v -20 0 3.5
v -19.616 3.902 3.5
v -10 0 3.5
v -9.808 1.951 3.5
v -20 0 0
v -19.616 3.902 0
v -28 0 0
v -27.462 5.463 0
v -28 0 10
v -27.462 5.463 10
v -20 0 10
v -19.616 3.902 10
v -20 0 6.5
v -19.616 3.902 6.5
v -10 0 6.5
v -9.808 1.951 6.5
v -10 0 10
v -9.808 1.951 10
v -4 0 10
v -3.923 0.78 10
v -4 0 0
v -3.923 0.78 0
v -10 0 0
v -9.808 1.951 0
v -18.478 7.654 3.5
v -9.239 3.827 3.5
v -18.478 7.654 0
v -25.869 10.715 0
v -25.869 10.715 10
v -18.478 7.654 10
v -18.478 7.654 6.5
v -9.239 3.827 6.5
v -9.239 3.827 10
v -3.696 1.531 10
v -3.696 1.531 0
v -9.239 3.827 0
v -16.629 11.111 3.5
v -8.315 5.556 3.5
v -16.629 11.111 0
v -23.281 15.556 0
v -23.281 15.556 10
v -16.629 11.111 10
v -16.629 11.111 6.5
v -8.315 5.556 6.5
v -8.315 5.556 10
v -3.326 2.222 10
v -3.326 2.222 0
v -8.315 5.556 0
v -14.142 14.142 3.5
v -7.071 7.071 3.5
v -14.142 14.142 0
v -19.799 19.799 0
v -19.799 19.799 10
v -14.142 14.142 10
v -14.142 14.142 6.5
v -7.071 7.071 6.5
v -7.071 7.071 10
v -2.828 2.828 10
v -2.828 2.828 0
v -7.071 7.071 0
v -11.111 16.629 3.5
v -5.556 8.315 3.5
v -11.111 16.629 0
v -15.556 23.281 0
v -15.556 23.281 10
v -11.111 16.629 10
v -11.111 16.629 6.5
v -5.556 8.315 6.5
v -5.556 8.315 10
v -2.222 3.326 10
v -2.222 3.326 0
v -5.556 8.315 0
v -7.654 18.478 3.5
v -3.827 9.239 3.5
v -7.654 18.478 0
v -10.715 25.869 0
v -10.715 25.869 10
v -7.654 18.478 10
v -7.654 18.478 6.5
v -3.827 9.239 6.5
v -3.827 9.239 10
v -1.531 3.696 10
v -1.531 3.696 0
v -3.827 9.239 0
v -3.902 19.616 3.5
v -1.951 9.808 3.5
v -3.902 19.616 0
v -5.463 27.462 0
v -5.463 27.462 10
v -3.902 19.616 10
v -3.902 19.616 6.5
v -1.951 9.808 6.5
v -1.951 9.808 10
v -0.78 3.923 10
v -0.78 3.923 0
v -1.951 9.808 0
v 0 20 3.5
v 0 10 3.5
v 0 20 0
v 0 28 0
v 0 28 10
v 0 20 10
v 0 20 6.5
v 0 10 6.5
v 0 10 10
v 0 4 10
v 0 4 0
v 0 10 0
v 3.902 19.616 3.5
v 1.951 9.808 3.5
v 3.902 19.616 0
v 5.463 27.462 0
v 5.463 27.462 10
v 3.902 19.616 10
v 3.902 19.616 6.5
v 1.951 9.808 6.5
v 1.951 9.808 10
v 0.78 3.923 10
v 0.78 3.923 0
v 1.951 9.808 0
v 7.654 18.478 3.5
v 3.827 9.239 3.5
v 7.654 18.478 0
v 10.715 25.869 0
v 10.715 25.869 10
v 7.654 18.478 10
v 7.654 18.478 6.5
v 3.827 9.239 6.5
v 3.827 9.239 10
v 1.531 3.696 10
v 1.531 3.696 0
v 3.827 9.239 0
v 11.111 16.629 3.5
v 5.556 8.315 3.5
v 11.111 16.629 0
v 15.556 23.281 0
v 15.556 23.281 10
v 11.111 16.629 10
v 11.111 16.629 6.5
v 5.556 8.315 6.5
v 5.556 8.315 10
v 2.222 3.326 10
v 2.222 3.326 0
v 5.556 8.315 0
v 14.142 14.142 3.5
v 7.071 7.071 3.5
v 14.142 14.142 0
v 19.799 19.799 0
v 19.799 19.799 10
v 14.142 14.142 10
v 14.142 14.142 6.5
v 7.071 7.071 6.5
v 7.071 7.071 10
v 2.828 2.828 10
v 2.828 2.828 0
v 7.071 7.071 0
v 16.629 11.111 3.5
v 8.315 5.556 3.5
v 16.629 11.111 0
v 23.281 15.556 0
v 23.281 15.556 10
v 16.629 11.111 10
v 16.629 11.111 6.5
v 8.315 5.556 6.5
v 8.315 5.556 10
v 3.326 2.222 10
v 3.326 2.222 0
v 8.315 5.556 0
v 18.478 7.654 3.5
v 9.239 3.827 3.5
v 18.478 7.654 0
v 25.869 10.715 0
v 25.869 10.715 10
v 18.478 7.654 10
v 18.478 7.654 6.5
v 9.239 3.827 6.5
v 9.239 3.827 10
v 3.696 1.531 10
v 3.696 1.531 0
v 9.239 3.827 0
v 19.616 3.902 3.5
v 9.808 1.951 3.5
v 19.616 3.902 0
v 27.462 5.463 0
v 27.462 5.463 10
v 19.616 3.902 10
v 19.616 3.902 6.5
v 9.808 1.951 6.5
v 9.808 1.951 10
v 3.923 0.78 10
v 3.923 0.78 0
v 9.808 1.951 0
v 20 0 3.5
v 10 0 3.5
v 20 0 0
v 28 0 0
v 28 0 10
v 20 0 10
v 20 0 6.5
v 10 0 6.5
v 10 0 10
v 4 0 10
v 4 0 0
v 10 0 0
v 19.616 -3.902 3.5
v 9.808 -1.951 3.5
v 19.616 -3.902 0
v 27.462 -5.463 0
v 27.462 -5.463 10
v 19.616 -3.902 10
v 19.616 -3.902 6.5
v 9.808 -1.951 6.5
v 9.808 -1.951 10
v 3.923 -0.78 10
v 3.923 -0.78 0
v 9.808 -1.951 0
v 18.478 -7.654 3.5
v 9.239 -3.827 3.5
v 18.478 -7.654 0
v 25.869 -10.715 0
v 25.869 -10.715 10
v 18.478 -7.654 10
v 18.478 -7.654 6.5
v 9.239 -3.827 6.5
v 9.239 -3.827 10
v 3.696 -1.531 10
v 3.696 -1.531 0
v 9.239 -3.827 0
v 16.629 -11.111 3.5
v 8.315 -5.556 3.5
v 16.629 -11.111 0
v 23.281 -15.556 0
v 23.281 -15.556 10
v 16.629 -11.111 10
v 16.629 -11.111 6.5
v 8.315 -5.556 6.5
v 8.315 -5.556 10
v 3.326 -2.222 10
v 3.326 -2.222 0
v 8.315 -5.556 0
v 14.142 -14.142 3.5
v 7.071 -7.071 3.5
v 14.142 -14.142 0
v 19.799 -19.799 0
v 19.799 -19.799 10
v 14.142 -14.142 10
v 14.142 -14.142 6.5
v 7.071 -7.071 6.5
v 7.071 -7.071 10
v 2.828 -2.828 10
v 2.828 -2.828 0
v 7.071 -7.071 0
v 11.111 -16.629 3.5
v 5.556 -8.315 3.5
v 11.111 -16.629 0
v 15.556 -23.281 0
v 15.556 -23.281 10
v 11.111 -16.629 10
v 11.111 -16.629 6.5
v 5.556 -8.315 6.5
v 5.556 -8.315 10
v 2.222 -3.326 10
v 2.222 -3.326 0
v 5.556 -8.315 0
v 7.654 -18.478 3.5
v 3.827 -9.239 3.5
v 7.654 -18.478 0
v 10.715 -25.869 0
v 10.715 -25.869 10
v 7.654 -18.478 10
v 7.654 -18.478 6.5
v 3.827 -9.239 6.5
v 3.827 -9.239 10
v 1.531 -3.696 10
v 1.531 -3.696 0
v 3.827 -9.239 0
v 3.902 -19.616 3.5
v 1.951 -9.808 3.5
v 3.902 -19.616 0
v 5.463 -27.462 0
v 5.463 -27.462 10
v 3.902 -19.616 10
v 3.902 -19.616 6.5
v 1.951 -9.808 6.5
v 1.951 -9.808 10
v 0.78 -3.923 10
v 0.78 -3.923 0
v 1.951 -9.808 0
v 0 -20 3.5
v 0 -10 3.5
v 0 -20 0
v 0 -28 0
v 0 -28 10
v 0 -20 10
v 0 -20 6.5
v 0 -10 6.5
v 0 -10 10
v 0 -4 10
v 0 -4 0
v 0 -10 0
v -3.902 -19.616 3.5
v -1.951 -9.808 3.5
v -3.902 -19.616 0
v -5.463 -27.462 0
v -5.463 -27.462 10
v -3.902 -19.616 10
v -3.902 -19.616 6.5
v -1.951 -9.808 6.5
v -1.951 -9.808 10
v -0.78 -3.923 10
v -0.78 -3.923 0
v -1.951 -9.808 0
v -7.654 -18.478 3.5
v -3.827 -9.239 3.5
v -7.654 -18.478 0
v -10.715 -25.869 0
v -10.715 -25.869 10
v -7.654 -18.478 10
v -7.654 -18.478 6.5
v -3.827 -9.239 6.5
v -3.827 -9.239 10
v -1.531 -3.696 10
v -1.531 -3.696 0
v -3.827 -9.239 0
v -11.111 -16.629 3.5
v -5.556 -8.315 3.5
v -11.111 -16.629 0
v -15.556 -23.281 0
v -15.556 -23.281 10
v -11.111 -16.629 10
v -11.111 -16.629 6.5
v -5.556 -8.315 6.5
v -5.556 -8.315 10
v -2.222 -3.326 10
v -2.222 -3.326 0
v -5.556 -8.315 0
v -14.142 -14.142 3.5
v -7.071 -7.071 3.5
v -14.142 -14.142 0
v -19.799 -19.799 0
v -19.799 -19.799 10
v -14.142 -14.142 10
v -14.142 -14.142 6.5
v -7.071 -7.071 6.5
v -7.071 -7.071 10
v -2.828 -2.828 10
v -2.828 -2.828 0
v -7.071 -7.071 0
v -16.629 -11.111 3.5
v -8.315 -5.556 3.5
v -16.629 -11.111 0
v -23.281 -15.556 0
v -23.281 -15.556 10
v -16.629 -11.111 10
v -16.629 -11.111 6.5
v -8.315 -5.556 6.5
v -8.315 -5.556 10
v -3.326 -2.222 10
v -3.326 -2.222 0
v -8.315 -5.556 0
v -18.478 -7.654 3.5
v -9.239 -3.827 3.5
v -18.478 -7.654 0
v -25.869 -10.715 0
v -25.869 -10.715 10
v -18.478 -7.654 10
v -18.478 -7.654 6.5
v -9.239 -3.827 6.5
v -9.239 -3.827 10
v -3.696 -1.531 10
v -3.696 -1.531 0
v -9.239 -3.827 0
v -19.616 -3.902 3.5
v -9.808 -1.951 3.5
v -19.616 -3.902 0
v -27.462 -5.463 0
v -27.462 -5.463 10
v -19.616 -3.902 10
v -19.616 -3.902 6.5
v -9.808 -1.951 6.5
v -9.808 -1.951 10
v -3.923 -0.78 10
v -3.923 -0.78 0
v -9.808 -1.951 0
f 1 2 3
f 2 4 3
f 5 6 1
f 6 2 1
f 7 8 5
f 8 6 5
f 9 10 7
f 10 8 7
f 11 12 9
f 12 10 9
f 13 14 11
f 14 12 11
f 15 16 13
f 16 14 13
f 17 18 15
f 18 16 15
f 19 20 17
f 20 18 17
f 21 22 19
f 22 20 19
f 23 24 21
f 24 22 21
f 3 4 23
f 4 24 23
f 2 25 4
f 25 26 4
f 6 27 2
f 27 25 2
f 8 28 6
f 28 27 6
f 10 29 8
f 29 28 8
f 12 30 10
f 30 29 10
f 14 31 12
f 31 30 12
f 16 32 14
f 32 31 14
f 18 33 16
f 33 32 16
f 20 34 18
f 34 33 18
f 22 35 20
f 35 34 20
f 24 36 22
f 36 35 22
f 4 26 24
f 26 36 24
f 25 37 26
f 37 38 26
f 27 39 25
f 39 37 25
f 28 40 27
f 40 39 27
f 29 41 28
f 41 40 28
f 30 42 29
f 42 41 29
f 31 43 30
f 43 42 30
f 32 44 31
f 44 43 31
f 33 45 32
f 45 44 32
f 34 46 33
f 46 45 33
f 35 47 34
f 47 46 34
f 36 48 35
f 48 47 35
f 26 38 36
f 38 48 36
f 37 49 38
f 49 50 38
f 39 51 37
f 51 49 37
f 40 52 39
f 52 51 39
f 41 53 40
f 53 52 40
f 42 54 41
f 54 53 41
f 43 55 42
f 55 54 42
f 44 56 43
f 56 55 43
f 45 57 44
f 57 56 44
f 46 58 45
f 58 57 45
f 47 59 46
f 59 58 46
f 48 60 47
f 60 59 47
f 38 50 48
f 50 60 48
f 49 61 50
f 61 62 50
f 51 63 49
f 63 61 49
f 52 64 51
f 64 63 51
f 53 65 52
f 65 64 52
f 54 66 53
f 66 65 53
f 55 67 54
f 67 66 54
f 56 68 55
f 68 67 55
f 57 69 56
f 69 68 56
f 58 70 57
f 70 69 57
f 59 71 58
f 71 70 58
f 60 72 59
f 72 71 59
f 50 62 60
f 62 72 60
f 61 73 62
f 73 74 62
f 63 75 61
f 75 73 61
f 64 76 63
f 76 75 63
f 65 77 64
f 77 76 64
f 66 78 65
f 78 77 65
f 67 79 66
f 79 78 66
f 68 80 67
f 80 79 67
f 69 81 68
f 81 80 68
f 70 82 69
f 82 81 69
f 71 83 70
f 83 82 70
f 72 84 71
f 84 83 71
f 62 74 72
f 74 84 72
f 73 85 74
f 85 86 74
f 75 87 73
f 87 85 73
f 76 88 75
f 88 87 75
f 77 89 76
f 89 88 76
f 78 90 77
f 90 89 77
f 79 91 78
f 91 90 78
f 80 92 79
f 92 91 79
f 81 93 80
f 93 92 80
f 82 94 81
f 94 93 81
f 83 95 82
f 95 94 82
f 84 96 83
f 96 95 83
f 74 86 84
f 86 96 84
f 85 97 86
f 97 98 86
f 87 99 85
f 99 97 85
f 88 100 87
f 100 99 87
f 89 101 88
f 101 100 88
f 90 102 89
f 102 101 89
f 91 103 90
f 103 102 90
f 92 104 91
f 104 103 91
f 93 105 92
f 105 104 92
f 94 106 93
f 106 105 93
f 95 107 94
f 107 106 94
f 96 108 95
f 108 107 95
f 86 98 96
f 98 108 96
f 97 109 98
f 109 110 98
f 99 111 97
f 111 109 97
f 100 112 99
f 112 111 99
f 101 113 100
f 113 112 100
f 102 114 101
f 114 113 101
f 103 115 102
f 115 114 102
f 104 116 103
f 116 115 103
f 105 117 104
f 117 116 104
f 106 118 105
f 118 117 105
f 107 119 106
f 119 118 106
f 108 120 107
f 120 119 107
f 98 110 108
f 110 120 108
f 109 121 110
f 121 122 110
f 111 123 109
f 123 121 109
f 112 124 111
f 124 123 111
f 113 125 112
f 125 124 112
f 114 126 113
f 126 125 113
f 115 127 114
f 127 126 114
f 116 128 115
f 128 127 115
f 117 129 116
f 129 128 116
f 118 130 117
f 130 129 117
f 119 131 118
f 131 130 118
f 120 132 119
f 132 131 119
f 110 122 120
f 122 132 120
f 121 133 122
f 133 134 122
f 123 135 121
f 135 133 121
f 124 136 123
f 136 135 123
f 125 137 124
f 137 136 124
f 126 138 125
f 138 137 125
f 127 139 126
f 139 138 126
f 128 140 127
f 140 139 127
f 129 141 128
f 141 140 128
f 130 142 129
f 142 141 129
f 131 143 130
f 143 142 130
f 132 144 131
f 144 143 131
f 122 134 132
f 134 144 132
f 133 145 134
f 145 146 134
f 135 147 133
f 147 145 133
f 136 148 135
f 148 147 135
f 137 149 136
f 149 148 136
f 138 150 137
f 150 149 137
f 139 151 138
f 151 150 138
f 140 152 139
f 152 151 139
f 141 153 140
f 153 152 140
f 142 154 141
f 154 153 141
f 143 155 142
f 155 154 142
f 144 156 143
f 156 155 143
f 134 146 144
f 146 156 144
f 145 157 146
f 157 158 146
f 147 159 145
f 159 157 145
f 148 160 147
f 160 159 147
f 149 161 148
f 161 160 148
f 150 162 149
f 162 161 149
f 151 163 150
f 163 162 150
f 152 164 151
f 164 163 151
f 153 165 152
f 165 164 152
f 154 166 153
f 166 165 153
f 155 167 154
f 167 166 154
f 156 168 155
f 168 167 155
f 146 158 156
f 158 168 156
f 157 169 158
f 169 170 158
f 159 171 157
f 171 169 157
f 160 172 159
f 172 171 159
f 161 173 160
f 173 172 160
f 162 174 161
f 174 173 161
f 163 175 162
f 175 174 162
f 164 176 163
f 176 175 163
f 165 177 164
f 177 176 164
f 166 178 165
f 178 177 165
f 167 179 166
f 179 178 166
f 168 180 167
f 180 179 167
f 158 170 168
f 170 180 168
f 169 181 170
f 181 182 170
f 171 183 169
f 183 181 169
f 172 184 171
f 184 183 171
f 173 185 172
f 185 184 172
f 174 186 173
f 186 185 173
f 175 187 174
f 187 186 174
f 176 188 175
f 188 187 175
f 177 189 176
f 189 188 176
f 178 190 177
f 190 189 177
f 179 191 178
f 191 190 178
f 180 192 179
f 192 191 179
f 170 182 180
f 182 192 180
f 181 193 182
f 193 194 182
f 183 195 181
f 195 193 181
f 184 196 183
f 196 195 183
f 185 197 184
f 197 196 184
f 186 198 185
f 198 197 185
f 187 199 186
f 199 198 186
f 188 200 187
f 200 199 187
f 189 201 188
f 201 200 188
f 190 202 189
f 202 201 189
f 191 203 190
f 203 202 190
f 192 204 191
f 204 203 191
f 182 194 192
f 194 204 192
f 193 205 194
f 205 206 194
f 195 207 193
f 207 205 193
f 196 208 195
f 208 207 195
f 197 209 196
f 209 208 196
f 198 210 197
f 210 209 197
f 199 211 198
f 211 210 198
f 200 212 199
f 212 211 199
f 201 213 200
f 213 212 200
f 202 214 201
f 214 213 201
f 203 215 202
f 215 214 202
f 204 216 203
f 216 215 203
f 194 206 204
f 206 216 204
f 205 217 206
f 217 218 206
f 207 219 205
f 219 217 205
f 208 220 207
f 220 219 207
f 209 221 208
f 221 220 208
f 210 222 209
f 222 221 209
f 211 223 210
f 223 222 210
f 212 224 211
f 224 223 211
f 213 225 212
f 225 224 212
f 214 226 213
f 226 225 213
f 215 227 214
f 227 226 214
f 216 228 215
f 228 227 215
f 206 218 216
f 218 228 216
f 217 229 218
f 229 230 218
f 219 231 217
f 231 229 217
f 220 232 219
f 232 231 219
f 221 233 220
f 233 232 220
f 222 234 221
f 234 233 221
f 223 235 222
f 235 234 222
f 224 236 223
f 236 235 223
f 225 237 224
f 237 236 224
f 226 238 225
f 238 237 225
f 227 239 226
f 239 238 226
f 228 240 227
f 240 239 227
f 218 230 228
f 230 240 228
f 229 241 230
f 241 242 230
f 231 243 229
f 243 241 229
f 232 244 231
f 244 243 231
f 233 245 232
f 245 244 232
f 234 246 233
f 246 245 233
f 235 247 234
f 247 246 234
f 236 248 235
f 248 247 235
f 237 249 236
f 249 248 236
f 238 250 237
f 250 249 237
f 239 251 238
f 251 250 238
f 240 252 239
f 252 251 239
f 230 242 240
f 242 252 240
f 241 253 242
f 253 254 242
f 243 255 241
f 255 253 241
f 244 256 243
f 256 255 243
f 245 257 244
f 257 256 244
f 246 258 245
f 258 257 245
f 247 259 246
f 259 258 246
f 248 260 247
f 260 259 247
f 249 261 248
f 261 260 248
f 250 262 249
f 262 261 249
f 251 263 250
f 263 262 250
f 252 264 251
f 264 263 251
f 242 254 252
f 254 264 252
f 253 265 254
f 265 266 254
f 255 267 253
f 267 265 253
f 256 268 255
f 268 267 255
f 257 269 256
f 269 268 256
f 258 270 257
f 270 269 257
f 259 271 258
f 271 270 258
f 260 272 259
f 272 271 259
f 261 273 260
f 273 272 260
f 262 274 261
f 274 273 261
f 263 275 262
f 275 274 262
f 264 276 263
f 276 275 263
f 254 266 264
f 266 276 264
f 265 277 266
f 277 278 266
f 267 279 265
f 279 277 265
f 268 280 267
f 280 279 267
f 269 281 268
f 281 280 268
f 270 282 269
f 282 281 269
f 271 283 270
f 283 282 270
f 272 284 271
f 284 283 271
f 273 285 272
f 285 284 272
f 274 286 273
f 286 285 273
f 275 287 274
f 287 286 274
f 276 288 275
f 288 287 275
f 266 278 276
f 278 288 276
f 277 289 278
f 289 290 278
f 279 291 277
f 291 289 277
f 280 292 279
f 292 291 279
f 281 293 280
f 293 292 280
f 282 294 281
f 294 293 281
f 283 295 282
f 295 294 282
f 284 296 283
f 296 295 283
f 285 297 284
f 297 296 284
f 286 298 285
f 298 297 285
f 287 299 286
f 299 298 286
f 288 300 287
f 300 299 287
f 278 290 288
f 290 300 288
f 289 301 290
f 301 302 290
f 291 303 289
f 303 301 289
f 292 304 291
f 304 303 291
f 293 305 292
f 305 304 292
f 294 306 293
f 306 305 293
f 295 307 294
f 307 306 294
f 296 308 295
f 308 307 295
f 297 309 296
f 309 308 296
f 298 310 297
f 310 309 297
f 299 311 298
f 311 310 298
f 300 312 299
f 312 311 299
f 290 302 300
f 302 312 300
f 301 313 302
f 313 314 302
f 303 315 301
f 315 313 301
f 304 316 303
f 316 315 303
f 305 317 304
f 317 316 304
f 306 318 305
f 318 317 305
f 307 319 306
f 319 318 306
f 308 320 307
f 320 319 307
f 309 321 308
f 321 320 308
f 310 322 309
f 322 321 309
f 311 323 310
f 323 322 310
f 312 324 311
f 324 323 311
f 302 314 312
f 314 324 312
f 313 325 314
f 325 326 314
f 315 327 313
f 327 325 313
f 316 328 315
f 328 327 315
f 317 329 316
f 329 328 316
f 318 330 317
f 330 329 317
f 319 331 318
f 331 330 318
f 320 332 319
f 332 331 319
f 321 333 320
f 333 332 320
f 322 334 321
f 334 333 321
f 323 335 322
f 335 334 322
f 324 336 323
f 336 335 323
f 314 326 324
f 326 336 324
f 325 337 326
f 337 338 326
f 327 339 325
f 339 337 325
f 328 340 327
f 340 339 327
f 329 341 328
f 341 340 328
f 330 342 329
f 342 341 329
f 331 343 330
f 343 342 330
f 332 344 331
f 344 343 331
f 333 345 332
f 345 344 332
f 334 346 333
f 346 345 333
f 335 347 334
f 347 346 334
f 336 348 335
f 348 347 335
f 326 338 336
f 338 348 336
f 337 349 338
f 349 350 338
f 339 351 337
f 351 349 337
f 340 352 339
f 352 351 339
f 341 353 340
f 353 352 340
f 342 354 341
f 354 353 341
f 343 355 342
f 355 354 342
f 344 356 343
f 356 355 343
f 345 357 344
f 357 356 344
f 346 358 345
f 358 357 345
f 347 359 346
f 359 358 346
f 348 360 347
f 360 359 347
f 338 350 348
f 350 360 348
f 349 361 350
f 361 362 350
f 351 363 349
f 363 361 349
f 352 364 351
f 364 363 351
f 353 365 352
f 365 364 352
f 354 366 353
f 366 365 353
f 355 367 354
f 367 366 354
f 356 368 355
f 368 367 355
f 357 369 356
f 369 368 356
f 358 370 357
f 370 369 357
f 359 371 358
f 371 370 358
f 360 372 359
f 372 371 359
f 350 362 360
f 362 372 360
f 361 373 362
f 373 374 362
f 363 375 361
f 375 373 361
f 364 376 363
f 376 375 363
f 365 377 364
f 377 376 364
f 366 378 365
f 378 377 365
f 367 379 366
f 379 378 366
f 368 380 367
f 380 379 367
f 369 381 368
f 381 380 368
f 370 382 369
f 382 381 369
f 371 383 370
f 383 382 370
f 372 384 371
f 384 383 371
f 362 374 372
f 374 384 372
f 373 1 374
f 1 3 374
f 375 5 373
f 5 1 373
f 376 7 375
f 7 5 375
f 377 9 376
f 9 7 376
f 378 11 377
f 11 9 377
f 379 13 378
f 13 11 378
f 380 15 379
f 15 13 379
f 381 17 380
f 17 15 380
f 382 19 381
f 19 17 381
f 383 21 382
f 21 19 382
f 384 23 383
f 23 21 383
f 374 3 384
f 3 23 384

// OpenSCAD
$fn = 32;

// ----------------------------------------------------------------------
// Revolved part: handwheel R28
// ----------------------------------------------------------------------

// --- parameters (mm) ---
bore_r = 4;               // bore radius
rim_r = 28;               // rim radius
rim_w = 8;                // rim axial width
rim_t = 10;               // rim diameter height
hub_r = 10;               // hub radius
web_t = 3;                // web thickness
revolve_angle = 360;      // revolve sweep, degrees
fit_tol = 0.05;           // declared fit tolerance (prompt contract)
free_tol = 0.3;           // declared free tolerance (prompt contract)

bore_d = 2 * bore_r;
rim_d = 2 * rim_r;
hub_d = 2 * hub_r;

profile = [[4, 0], [10, 0], [10, 3.5], [20, 3.5], [20, 0], [28, 0], [28, 10], [20, 10], [20, 6.5], [10, 6.5], [10, 10], [4, 10]];  // primary outline, 12 points, counter clockwise

// --- the one profile operation ---
rotate_extrude(angle = revolve_angle) polygon(points = profile);
